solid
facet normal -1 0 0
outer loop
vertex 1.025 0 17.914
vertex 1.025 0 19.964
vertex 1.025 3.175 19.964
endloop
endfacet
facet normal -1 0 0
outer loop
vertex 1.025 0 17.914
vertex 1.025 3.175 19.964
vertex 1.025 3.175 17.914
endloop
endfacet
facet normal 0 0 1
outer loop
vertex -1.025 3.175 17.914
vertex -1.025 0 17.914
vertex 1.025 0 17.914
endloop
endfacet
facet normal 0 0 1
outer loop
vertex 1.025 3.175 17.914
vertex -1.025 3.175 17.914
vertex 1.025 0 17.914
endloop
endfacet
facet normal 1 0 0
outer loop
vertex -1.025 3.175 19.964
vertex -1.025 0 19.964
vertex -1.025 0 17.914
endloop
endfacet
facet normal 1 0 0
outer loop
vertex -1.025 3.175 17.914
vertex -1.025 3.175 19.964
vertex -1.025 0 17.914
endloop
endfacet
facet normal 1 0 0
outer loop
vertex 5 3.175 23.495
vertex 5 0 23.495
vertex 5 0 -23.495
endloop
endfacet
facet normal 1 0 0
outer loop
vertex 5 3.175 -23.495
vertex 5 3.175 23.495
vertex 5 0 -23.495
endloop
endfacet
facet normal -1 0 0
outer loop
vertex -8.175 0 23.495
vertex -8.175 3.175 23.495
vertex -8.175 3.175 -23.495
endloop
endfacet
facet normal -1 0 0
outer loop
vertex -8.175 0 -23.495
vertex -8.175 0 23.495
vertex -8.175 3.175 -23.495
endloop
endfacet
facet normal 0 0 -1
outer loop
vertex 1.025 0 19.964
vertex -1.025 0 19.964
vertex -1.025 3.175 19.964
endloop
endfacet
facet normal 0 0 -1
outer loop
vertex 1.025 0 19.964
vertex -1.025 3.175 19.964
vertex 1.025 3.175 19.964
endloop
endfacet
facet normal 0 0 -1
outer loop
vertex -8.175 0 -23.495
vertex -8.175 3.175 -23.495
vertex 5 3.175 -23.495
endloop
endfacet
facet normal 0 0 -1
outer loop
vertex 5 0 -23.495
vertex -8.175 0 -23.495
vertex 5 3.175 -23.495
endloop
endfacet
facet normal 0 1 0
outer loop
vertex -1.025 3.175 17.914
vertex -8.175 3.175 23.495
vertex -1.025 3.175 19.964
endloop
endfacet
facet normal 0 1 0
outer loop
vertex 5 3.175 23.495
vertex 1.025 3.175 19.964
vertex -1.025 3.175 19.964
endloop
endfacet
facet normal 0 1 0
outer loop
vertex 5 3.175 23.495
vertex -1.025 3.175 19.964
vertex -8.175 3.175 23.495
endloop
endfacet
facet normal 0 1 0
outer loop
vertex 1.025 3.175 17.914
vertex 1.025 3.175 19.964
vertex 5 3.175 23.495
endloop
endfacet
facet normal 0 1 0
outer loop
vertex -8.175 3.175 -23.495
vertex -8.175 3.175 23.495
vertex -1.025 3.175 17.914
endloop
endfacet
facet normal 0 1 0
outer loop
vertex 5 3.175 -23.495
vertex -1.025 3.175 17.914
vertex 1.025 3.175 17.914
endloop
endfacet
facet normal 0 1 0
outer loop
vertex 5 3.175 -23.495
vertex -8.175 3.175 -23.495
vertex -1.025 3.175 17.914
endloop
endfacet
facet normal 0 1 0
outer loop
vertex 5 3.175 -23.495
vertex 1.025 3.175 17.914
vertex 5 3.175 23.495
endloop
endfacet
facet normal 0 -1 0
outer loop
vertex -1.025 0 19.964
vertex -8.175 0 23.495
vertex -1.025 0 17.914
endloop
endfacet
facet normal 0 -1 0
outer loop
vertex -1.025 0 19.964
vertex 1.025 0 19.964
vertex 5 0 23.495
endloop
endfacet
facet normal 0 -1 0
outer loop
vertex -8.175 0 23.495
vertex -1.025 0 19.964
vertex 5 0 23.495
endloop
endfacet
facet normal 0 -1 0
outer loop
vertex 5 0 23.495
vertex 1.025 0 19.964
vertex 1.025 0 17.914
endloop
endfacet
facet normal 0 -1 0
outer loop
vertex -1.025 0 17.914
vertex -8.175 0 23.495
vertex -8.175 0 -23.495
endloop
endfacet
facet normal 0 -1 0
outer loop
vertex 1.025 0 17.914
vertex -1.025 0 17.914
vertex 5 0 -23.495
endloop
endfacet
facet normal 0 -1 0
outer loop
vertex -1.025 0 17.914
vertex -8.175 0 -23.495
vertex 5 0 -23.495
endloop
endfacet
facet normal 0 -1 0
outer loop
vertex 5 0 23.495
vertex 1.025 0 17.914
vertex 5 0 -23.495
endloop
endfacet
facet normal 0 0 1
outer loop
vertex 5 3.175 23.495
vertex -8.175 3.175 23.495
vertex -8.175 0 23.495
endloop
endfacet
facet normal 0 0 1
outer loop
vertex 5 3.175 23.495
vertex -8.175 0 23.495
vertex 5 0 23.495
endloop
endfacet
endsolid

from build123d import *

# Parameters (mm, degrees)
SKETCH1_W           = 10
SKETCH1_H           = 46.99
SKETCH1_W_2         = 2.049999964
SKETCH1_H_2         = 2.049999964
BOSS_EXTRUDE1_DEPTH = 3.175
SKETCH2_W           = 3.175
SKETCH2_H           = 46.99
BOSS_EXTRUDE2_DEPTH = 3.175


with BuildPart() as part:
    # Sketch1 → Boss-Extrude1 (new body)
    with BuildSketch(Plane(origin=(0, 0, 0), x_dir=(1, 0, 0), z_dir=(0, 1, 0))):
        Rectangle(SKETCH1_W, SKETCH1_H)
        with Locations((0, -18.939243554)):
            Rectangle(SKETCH1_W_2, SKETCH1_H_2, mode=Mode.SUBTRACT)
    extrude(amount=BOSS_EXTRUDE1_DEPTH)

    # Sketch2 → Boss-Extrude2 (add)
    with BuildSketch(Plane(origin=(0, 3.175, 0), x_dir=(1, 0, 0), z_dir=(0, 1, 0))):
        with Locations((-6.5875, 0)):
            Rectangle(SKETCH2_W, SKETCH2_H)
    extrude(amount=-BOSS_EXTRUDE2_DEPTH)


solid = part.part
